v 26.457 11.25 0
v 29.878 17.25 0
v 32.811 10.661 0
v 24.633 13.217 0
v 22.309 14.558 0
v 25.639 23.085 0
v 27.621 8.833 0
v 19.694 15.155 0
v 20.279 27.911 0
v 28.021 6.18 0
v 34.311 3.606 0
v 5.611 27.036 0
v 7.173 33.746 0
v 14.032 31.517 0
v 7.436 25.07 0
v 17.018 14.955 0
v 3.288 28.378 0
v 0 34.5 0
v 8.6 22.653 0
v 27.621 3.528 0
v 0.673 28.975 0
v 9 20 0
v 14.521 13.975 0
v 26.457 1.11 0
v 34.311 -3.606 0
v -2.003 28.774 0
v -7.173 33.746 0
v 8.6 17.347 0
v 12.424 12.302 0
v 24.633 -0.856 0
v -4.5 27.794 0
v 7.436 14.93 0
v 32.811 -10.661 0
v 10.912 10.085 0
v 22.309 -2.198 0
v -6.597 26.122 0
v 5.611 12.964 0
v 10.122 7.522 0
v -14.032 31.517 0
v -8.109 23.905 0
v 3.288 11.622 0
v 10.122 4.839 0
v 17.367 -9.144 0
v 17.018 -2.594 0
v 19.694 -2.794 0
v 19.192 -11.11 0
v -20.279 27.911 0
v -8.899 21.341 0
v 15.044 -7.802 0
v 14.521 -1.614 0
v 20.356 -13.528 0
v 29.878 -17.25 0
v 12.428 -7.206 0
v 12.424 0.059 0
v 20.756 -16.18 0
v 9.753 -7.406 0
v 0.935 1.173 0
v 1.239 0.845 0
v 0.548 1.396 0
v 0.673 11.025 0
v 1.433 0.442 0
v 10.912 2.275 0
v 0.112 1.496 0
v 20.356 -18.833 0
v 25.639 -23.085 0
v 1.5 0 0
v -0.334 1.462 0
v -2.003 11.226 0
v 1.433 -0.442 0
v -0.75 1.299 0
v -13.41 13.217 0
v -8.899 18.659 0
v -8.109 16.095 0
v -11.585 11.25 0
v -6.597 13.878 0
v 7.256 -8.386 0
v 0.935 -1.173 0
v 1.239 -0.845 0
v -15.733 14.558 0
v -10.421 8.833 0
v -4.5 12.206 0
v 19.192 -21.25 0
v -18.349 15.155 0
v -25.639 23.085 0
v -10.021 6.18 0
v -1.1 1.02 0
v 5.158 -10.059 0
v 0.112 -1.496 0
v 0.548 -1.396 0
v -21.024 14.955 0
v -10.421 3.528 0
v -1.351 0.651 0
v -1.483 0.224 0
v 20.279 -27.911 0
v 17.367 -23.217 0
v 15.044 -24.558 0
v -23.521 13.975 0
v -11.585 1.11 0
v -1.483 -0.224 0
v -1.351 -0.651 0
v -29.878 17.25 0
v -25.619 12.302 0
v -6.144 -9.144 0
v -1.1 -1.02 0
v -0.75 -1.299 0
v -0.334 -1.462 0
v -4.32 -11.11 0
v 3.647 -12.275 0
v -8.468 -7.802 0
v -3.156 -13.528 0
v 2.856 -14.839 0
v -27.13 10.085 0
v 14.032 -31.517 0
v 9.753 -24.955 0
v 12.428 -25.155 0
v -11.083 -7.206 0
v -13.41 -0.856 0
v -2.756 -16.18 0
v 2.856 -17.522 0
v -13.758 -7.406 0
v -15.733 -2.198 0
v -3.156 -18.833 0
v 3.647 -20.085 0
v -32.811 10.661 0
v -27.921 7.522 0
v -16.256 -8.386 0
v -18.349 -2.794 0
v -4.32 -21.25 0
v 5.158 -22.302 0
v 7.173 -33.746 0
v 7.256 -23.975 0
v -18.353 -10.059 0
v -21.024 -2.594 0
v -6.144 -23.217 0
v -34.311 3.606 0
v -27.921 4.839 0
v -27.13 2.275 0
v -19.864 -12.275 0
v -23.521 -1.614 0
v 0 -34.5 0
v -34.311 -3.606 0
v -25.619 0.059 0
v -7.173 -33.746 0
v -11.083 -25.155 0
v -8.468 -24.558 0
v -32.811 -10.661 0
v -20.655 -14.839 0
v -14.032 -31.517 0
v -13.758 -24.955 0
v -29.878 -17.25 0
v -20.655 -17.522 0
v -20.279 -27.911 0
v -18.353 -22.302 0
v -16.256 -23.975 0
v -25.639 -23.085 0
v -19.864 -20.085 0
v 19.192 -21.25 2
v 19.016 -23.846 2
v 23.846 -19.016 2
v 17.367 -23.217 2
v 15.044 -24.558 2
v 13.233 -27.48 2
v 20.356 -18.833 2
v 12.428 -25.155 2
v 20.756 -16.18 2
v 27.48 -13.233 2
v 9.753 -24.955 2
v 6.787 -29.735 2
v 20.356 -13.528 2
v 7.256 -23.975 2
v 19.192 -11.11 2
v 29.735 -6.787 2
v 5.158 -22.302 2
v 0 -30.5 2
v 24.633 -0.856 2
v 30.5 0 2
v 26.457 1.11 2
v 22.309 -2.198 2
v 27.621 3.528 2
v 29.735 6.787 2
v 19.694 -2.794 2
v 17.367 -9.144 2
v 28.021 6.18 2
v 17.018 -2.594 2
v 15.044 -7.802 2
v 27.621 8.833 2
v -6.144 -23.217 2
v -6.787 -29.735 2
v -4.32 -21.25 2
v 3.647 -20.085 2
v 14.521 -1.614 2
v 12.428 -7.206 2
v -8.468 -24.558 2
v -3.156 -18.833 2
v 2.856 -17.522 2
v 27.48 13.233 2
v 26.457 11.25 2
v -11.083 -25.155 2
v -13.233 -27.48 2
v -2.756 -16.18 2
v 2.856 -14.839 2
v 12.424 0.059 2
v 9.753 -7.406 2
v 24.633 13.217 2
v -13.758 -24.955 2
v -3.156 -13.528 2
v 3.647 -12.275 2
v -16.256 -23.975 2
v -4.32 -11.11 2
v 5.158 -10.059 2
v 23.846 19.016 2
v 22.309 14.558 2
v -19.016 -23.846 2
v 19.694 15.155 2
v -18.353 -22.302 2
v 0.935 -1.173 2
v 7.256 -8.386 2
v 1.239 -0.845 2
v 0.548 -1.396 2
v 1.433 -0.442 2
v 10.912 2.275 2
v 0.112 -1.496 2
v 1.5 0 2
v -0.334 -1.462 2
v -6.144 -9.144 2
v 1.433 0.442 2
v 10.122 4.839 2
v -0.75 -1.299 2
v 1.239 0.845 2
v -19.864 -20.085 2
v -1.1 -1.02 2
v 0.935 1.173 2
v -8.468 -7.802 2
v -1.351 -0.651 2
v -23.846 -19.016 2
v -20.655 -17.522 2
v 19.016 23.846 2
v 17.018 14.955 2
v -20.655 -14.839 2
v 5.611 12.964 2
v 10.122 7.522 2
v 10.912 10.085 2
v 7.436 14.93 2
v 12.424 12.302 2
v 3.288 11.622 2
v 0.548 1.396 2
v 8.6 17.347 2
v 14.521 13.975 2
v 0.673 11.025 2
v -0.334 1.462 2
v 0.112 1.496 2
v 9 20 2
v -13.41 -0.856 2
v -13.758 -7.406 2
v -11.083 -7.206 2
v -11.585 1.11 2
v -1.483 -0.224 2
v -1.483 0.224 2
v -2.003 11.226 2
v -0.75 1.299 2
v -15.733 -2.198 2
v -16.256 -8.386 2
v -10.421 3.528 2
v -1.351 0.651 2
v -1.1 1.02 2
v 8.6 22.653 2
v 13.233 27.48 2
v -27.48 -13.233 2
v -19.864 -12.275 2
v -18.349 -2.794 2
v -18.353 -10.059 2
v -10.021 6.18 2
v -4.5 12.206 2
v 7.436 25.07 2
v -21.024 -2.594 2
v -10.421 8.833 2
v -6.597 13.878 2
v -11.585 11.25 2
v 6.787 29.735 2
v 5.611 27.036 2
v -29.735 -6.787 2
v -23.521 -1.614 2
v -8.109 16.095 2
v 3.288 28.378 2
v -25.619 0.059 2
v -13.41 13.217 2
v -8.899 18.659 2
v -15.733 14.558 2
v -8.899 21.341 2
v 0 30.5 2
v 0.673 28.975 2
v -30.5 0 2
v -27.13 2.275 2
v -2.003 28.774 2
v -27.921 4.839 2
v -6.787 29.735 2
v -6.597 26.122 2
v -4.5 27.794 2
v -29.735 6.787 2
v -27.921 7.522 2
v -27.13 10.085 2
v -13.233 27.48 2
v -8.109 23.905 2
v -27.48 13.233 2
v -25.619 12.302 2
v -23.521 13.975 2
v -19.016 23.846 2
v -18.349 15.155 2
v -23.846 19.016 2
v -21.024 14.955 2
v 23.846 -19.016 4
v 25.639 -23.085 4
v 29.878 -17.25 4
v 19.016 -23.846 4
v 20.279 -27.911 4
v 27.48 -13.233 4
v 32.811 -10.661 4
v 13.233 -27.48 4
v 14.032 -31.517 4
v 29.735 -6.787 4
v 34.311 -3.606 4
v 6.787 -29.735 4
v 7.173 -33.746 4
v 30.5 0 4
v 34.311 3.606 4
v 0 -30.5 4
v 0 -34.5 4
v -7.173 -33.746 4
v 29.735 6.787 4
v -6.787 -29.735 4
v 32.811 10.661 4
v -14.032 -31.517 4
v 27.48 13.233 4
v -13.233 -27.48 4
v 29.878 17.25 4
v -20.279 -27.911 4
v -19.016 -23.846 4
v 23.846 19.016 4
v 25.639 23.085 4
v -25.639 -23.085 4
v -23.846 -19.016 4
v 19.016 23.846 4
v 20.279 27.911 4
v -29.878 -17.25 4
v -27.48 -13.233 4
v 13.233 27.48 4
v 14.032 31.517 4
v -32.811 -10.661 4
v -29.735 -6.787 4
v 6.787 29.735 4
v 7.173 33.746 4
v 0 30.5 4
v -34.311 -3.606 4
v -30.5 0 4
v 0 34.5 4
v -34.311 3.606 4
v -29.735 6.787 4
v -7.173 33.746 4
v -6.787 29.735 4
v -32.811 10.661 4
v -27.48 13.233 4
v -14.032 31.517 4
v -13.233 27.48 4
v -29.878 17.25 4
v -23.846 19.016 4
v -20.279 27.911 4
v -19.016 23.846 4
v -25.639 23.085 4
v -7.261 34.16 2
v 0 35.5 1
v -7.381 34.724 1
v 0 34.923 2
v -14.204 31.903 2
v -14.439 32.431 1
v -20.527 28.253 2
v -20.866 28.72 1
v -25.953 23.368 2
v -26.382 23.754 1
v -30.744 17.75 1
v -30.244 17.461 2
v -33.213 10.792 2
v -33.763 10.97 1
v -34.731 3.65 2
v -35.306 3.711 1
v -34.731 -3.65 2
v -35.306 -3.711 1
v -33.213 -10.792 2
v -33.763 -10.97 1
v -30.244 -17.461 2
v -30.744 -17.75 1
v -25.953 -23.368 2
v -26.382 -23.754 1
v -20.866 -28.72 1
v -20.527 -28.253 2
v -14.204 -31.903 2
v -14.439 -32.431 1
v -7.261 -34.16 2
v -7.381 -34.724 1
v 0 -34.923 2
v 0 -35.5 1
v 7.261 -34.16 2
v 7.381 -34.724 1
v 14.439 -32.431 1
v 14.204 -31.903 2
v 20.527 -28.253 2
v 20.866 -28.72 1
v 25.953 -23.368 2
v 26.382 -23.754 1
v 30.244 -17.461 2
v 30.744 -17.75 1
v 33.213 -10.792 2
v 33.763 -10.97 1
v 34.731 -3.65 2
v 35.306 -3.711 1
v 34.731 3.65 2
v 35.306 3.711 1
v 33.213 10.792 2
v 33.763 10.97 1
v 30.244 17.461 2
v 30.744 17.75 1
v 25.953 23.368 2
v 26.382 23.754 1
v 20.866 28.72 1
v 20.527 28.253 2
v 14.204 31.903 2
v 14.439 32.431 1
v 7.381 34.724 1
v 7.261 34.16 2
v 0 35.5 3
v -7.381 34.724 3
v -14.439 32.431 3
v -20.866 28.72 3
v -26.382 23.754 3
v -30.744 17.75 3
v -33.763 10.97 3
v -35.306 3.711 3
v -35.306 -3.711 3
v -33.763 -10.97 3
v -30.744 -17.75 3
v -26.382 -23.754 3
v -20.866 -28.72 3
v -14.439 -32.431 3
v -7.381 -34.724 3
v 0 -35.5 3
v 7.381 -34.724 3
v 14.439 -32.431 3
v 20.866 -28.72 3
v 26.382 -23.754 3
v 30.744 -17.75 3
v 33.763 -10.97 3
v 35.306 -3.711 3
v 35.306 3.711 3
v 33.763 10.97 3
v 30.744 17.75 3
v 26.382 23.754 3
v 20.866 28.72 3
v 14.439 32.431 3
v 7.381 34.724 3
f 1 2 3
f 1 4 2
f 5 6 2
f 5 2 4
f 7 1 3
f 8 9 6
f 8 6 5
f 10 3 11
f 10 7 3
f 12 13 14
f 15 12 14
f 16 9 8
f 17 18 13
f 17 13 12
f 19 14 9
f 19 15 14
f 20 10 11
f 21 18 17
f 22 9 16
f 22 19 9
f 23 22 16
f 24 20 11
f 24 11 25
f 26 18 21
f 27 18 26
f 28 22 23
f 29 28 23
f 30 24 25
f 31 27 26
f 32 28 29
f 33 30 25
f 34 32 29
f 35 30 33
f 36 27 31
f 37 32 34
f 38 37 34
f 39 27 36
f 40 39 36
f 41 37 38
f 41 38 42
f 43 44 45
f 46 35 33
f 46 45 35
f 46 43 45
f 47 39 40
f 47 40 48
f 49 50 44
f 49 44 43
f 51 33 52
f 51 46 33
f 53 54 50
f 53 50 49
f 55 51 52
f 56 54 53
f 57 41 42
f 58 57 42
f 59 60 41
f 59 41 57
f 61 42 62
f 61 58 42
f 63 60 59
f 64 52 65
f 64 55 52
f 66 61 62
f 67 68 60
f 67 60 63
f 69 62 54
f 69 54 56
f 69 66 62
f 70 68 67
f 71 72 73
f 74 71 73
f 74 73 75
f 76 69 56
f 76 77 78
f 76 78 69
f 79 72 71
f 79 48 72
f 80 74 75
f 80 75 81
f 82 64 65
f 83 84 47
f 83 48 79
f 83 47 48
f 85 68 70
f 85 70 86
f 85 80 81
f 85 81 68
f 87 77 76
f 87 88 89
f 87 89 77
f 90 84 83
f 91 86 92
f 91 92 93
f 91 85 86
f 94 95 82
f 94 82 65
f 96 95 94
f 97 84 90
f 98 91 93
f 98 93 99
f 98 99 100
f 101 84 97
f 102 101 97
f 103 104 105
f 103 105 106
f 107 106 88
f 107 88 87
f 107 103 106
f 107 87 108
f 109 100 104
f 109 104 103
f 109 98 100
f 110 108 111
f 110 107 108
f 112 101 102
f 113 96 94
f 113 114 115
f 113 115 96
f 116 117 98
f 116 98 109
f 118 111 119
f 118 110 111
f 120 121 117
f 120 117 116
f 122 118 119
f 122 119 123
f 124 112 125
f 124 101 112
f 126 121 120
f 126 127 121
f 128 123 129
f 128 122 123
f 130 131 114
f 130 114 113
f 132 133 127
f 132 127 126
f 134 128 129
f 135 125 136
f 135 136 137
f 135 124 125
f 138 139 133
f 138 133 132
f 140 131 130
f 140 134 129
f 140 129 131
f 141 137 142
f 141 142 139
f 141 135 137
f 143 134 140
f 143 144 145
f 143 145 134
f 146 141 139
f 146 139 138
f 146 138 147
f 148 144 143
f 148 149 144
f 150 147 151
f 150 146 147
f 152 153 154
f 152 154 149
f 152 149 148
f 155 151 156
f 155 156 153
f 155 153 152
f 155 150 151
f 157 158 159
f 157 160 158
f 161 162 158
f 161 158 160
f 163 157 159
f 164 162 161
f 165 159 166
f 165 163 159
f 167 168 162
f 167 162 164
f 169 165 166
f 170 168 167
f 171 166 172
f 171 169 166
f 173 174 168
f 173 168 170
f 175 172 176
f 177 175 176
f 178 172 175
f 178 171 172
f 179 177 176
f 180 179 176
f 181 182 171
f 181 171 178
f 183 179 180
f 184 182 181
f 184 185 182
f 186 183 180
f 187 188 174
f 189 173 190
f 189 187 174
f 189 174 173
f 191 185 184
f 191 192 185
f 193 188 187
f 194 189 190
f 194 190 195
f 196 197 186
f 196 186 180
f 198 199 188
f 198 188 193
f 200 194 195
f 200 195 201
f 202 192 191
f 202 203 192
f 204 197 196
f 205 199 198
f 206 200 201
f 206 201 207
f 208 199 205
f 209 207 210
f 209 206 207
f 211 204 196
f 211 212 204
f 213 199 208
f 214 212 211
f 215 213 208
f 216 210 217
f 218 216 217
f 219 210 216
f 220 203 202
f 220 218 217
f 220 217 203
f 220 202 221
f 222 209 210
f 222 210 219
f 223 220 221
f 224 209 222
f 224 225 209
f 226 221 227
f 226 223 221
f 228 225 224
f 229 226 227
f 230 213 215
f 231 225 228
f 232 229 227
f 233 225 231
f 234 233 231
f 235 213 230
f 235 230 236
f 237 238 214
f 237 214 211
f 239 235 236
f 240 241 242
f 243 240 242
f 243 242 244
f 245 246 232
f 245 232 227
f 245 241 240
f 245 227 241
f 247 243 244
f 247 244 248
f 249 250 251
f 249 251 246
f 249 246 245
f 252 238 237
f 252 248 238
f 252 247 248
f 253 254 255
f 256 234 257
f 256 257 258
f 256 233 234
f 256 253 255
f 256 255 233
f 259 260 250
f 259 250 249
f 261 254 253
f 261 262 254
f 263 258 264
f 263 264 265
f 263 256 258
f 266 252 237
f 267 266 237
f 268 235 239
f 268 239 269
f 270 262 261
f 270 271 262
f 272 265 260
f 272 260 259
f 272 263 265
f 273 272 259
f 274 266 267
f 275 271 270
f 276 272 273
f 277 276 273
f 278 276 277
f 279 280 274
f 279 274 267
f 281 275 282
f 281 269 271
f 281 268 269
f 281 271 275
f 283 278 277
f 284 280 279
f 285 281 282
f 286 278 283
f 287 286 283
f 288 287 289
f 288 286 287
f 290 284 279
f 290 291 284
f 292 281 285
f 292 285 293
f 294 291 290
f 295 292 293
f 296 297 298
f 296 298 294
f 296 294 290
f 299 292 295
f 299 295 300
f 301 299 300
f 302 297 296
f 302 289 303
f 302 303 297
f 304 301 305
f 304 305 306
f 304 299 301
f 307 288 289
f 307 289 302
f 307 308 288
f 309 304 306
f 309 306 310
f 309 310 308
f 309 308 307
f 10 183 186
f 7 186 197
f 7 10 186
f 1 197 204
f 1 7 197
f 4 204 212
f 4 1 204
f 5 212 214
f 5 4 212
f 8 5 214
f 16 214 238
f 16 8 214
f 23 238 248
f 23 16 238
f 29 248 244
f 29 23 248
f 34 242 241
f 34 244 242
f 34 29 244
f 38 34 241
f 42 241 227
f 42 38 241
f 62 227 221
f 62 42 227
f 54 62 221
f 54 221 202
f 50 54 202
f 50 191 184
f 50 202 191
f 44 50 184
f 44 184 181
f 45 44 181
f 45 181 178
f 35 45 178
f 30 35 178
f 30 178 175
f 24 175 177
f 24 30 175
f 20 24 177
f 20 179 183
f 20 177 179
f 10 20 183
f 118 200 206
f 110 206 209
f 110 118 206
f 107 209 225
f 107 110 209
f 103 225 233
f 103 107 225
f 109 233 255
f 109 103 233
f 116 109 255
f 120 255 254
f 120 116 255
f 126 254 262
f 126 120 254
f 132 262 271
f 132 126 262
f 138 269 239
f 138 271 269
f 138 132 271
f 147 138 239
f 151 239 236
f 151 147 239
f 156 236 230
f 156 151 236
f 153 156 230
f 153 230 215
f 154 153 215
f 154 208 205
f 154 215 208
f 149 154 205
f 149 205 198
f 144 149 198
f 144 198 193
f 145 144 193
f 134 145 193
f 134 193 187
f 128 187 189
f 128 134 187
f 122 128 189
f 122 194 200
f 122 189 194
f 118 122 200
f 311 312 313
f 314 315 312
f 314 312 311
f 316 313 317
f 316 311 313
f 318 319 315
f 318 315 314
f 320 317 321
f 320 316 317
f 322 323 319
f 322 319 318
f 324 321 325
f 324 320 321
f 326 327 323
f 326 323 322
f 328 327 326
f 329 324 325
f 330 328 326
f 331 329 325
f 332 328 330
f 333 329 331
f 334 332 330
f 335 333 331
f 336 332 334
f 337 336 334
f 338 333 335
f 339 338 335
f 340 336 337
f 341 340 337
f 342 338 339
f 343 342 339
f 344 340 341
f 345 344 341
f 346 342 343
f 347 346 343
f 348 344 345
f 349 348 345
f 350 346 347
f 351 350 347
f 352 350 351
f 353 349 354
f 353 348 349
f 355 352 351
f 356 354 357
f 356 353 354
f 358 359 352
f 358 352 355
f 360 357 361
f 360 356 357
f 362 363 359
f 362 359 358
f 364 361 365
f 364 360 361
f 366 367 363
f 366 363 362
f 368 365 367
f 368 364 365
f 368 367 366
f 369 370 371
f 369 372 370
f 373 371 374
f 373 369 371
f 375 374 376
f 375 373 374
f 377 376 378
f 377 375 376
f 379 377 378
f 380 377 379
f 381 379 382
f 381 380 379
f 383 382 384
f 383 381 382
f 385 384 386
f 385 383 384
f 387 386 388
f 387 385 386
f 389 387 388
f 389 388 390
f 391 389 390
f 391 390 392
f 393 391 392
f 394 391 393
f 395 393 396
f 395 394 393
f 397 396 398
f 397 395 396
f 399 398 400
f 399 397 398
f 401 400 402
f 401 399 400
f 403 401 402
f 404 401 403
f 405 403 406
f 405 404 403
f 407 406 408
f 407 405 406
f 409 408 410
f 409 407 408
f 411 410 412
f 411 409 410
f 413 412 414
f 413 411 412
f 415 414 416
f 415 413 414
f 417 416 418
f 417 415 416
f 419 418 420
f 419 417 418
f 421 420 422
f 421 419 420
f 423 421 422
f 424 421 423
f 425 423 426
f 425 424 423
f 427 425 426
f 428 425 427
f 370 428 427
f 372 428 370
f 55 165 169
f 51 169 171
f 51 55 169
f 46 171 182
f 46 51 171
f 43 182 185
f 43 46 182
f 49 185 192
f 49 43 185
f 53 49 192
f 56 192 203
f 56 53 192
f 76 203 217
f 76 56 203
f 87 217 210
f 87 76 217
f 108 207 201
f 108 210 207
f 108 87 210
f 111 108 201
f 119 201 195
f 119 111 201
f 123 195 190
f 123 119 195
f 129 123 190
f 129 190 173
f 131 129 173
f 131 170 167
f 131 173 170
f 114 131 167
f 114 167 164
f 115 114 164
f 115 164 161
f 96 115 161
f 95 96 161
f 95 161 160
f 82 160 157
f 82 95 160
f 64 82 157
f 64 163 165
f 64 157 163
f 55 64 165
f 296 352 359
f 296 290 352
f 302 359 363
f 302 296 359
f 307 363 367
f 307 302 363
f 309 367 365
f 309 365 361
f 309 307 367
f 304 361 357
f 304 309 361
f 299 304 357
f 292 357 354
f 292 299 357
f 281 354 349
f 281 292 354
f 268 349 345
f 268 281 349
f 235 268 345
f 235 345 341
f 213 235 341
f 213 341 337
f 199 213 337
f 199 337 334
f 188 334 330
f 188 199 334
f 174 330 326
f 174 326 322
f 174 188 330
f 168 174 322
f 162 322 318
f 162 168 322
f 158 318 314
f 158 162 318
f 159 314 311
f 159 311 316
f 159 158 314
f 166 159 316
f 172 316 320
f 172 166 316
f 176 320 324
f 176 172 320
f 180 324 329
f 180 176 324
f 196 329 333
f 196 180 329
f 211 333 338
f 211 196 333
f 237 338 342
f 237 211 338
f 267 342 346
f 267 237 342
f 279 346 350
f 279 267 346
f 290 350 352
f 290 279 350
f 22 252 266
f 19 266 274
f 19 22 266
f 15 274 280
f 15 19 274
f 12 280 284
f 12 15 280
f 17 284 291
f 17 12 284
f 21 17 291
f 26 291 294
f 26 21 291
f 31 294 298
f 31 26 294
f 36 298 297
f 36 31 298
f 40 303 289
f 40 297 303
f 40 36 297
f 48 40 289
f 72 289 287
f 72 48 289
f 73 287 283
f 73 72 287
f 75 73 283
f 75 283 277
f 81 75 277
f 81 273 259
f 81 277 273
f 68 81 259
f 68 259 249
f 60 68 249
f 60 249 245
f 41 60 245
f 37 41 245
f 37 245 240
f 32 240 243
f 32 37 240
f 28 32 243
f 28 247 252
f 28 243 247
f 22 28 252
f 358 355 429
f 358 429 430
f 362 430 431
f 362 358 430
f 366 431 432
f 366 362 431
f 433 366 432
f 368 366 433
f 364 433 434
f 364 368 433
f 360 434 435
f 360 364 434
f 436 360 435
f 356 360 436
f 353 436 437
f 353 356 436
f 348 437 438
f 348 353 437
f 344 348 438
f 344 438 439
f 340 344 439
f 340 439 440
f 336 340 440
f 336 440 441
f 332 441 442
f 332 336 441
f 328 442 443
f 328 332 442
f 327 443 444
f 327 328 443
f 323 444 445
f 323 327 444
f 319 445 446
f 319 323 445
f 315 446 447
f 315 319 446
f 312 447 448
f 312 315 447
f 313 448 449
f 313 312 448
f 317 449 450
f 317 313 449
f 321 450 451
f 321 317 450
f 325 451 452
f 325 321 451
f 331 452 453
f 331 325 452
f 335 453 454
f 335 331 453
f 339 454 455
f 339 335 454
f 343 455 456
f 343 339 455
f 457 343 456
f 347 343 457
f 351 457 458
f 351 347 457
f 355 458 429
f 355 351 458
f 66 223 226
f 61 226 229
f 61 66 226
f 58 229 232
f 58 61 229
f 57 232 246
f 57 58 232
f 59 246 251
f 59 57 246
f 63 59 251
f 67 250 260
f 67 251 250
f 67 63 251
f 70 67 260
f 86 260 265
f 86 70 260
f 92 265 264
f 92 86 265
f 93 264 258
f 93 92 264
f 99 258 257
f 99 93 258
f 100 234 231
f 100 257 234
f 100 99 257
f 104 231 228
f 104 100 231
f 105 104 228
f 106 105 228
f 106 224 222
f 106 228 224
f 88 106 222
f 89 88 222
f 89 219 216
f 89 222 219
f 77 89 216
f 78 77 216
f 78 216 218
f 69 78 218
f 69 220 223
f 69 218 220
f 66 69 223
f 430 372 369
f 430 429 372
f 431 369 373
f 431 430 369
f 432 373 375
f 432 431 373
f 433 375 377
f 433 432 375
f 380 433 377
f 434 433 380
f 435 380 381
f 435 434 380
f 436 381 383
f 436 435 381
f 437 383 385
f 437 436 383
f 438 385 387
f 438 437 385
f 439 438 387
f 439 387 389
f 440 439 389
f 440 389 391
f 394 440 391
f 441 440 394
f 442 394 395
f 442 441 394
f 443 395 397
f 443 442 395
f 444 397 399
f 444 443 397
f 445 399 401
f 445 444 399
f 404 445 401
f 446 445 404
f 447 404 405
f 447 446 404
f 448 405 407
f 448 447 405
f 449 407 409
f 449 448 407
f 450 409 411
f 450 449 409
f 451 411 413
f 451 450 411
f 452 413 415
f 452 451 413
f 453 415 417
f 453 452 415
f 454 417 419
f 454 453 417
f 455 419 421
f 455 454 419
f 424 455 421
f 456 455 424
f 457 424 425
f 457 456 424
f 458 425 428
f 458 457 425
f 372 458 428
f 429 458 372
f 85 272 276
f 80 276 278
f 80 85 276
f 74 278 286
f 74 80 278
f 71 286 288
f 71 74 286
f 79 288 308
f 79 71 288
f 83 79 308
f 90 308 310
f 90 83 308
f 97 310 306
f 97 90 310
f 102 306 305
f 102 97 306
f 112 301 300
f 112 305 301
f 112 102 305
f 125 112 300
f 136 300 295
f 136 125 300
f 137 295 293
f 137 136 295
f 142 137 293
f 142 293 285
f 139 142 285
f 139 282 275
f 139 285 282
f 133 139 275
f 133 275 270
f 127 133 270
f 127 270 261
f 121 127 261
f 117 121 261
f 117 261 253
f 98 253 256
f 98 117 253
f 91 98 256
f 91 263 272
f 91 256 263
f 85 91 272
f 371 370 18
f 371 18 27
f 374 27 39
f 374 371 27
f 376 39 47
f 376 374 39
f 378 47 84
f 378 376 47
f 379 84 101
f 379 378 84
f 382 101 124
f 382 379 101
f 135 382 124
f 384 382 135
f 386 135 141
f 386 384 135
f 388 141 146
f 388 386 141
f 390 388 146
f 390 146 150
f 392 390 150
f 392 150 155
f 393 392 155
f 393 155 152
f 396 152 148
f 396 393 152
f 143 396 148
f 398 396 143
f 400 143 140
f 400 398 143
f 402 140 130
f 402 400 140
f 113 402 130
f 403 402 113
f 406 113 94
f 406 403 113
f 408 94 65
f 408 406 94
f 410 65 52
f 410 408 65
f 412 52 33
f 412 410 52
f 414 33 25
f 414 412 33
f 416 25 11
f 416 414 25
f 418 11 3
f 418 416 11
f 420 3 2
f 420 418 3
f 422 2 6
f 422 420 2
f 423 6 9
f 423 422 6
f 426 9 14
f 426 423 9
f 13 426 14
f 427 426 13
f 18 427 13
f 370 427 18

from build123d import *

# Parameters (mm, degrees)
F0_R     = 9
F0_R_2   = 1.5
F3_DEPTH = 25
F4_SIZE  = 0.99999


# Not quite as in the source:
# - a fillet or chamfer is up to 0.001 mm smaller than in the source, because OpenCascade refuses the exact size


with BuildPart() as f2:
    # F1 (on Right) → F2 (revolve)
    with BuildSketch(Plane.YZ):
        Polygon((0, 2), (0, 0), (35.5, 0), (35.5, 1), (34.9226497308, 2), (35.5, 3), (35.5, 4), (30.5, 4), (30.5, 2), align=None)
    revolve(axis=Axis((0, 0, 11.7082232609), (0, 0, 1)))

    # F0 (on Top) → F3 (cut)
    with BuildSketch(Plane.XY):
        with Locations((11.7557050458, -16.1803398875)):
            Circle(F0_R)
        with Locations((-11.7557050458, -16.1803398875)):
            Circle(F0_R)
        with Locations((-19.0211303259, 6.1803398875)):
            Circle(F0_R)
        with Locations((0, 20)):
            Circle(F0_R)
        with Locations((19.0211303259, 6.1803398875)):
            Circle(F0_R)
        Circle(F0_R_2)
    extrude(amount=F3_DEPTH, mode=Mode.SUBTRACT)

    # F4 (size 1 in the source; OpenCascade refuses exactly that, so slightly less here)
    f4_edges = [f2.edges().sort_by_distance(p)[0] for p in [
        (0, -35.5, 4),
        (0, -35.5, 0),
    ]]
    chamfer(f4_edges, length=F4_SIZE)


solid = f2.part
